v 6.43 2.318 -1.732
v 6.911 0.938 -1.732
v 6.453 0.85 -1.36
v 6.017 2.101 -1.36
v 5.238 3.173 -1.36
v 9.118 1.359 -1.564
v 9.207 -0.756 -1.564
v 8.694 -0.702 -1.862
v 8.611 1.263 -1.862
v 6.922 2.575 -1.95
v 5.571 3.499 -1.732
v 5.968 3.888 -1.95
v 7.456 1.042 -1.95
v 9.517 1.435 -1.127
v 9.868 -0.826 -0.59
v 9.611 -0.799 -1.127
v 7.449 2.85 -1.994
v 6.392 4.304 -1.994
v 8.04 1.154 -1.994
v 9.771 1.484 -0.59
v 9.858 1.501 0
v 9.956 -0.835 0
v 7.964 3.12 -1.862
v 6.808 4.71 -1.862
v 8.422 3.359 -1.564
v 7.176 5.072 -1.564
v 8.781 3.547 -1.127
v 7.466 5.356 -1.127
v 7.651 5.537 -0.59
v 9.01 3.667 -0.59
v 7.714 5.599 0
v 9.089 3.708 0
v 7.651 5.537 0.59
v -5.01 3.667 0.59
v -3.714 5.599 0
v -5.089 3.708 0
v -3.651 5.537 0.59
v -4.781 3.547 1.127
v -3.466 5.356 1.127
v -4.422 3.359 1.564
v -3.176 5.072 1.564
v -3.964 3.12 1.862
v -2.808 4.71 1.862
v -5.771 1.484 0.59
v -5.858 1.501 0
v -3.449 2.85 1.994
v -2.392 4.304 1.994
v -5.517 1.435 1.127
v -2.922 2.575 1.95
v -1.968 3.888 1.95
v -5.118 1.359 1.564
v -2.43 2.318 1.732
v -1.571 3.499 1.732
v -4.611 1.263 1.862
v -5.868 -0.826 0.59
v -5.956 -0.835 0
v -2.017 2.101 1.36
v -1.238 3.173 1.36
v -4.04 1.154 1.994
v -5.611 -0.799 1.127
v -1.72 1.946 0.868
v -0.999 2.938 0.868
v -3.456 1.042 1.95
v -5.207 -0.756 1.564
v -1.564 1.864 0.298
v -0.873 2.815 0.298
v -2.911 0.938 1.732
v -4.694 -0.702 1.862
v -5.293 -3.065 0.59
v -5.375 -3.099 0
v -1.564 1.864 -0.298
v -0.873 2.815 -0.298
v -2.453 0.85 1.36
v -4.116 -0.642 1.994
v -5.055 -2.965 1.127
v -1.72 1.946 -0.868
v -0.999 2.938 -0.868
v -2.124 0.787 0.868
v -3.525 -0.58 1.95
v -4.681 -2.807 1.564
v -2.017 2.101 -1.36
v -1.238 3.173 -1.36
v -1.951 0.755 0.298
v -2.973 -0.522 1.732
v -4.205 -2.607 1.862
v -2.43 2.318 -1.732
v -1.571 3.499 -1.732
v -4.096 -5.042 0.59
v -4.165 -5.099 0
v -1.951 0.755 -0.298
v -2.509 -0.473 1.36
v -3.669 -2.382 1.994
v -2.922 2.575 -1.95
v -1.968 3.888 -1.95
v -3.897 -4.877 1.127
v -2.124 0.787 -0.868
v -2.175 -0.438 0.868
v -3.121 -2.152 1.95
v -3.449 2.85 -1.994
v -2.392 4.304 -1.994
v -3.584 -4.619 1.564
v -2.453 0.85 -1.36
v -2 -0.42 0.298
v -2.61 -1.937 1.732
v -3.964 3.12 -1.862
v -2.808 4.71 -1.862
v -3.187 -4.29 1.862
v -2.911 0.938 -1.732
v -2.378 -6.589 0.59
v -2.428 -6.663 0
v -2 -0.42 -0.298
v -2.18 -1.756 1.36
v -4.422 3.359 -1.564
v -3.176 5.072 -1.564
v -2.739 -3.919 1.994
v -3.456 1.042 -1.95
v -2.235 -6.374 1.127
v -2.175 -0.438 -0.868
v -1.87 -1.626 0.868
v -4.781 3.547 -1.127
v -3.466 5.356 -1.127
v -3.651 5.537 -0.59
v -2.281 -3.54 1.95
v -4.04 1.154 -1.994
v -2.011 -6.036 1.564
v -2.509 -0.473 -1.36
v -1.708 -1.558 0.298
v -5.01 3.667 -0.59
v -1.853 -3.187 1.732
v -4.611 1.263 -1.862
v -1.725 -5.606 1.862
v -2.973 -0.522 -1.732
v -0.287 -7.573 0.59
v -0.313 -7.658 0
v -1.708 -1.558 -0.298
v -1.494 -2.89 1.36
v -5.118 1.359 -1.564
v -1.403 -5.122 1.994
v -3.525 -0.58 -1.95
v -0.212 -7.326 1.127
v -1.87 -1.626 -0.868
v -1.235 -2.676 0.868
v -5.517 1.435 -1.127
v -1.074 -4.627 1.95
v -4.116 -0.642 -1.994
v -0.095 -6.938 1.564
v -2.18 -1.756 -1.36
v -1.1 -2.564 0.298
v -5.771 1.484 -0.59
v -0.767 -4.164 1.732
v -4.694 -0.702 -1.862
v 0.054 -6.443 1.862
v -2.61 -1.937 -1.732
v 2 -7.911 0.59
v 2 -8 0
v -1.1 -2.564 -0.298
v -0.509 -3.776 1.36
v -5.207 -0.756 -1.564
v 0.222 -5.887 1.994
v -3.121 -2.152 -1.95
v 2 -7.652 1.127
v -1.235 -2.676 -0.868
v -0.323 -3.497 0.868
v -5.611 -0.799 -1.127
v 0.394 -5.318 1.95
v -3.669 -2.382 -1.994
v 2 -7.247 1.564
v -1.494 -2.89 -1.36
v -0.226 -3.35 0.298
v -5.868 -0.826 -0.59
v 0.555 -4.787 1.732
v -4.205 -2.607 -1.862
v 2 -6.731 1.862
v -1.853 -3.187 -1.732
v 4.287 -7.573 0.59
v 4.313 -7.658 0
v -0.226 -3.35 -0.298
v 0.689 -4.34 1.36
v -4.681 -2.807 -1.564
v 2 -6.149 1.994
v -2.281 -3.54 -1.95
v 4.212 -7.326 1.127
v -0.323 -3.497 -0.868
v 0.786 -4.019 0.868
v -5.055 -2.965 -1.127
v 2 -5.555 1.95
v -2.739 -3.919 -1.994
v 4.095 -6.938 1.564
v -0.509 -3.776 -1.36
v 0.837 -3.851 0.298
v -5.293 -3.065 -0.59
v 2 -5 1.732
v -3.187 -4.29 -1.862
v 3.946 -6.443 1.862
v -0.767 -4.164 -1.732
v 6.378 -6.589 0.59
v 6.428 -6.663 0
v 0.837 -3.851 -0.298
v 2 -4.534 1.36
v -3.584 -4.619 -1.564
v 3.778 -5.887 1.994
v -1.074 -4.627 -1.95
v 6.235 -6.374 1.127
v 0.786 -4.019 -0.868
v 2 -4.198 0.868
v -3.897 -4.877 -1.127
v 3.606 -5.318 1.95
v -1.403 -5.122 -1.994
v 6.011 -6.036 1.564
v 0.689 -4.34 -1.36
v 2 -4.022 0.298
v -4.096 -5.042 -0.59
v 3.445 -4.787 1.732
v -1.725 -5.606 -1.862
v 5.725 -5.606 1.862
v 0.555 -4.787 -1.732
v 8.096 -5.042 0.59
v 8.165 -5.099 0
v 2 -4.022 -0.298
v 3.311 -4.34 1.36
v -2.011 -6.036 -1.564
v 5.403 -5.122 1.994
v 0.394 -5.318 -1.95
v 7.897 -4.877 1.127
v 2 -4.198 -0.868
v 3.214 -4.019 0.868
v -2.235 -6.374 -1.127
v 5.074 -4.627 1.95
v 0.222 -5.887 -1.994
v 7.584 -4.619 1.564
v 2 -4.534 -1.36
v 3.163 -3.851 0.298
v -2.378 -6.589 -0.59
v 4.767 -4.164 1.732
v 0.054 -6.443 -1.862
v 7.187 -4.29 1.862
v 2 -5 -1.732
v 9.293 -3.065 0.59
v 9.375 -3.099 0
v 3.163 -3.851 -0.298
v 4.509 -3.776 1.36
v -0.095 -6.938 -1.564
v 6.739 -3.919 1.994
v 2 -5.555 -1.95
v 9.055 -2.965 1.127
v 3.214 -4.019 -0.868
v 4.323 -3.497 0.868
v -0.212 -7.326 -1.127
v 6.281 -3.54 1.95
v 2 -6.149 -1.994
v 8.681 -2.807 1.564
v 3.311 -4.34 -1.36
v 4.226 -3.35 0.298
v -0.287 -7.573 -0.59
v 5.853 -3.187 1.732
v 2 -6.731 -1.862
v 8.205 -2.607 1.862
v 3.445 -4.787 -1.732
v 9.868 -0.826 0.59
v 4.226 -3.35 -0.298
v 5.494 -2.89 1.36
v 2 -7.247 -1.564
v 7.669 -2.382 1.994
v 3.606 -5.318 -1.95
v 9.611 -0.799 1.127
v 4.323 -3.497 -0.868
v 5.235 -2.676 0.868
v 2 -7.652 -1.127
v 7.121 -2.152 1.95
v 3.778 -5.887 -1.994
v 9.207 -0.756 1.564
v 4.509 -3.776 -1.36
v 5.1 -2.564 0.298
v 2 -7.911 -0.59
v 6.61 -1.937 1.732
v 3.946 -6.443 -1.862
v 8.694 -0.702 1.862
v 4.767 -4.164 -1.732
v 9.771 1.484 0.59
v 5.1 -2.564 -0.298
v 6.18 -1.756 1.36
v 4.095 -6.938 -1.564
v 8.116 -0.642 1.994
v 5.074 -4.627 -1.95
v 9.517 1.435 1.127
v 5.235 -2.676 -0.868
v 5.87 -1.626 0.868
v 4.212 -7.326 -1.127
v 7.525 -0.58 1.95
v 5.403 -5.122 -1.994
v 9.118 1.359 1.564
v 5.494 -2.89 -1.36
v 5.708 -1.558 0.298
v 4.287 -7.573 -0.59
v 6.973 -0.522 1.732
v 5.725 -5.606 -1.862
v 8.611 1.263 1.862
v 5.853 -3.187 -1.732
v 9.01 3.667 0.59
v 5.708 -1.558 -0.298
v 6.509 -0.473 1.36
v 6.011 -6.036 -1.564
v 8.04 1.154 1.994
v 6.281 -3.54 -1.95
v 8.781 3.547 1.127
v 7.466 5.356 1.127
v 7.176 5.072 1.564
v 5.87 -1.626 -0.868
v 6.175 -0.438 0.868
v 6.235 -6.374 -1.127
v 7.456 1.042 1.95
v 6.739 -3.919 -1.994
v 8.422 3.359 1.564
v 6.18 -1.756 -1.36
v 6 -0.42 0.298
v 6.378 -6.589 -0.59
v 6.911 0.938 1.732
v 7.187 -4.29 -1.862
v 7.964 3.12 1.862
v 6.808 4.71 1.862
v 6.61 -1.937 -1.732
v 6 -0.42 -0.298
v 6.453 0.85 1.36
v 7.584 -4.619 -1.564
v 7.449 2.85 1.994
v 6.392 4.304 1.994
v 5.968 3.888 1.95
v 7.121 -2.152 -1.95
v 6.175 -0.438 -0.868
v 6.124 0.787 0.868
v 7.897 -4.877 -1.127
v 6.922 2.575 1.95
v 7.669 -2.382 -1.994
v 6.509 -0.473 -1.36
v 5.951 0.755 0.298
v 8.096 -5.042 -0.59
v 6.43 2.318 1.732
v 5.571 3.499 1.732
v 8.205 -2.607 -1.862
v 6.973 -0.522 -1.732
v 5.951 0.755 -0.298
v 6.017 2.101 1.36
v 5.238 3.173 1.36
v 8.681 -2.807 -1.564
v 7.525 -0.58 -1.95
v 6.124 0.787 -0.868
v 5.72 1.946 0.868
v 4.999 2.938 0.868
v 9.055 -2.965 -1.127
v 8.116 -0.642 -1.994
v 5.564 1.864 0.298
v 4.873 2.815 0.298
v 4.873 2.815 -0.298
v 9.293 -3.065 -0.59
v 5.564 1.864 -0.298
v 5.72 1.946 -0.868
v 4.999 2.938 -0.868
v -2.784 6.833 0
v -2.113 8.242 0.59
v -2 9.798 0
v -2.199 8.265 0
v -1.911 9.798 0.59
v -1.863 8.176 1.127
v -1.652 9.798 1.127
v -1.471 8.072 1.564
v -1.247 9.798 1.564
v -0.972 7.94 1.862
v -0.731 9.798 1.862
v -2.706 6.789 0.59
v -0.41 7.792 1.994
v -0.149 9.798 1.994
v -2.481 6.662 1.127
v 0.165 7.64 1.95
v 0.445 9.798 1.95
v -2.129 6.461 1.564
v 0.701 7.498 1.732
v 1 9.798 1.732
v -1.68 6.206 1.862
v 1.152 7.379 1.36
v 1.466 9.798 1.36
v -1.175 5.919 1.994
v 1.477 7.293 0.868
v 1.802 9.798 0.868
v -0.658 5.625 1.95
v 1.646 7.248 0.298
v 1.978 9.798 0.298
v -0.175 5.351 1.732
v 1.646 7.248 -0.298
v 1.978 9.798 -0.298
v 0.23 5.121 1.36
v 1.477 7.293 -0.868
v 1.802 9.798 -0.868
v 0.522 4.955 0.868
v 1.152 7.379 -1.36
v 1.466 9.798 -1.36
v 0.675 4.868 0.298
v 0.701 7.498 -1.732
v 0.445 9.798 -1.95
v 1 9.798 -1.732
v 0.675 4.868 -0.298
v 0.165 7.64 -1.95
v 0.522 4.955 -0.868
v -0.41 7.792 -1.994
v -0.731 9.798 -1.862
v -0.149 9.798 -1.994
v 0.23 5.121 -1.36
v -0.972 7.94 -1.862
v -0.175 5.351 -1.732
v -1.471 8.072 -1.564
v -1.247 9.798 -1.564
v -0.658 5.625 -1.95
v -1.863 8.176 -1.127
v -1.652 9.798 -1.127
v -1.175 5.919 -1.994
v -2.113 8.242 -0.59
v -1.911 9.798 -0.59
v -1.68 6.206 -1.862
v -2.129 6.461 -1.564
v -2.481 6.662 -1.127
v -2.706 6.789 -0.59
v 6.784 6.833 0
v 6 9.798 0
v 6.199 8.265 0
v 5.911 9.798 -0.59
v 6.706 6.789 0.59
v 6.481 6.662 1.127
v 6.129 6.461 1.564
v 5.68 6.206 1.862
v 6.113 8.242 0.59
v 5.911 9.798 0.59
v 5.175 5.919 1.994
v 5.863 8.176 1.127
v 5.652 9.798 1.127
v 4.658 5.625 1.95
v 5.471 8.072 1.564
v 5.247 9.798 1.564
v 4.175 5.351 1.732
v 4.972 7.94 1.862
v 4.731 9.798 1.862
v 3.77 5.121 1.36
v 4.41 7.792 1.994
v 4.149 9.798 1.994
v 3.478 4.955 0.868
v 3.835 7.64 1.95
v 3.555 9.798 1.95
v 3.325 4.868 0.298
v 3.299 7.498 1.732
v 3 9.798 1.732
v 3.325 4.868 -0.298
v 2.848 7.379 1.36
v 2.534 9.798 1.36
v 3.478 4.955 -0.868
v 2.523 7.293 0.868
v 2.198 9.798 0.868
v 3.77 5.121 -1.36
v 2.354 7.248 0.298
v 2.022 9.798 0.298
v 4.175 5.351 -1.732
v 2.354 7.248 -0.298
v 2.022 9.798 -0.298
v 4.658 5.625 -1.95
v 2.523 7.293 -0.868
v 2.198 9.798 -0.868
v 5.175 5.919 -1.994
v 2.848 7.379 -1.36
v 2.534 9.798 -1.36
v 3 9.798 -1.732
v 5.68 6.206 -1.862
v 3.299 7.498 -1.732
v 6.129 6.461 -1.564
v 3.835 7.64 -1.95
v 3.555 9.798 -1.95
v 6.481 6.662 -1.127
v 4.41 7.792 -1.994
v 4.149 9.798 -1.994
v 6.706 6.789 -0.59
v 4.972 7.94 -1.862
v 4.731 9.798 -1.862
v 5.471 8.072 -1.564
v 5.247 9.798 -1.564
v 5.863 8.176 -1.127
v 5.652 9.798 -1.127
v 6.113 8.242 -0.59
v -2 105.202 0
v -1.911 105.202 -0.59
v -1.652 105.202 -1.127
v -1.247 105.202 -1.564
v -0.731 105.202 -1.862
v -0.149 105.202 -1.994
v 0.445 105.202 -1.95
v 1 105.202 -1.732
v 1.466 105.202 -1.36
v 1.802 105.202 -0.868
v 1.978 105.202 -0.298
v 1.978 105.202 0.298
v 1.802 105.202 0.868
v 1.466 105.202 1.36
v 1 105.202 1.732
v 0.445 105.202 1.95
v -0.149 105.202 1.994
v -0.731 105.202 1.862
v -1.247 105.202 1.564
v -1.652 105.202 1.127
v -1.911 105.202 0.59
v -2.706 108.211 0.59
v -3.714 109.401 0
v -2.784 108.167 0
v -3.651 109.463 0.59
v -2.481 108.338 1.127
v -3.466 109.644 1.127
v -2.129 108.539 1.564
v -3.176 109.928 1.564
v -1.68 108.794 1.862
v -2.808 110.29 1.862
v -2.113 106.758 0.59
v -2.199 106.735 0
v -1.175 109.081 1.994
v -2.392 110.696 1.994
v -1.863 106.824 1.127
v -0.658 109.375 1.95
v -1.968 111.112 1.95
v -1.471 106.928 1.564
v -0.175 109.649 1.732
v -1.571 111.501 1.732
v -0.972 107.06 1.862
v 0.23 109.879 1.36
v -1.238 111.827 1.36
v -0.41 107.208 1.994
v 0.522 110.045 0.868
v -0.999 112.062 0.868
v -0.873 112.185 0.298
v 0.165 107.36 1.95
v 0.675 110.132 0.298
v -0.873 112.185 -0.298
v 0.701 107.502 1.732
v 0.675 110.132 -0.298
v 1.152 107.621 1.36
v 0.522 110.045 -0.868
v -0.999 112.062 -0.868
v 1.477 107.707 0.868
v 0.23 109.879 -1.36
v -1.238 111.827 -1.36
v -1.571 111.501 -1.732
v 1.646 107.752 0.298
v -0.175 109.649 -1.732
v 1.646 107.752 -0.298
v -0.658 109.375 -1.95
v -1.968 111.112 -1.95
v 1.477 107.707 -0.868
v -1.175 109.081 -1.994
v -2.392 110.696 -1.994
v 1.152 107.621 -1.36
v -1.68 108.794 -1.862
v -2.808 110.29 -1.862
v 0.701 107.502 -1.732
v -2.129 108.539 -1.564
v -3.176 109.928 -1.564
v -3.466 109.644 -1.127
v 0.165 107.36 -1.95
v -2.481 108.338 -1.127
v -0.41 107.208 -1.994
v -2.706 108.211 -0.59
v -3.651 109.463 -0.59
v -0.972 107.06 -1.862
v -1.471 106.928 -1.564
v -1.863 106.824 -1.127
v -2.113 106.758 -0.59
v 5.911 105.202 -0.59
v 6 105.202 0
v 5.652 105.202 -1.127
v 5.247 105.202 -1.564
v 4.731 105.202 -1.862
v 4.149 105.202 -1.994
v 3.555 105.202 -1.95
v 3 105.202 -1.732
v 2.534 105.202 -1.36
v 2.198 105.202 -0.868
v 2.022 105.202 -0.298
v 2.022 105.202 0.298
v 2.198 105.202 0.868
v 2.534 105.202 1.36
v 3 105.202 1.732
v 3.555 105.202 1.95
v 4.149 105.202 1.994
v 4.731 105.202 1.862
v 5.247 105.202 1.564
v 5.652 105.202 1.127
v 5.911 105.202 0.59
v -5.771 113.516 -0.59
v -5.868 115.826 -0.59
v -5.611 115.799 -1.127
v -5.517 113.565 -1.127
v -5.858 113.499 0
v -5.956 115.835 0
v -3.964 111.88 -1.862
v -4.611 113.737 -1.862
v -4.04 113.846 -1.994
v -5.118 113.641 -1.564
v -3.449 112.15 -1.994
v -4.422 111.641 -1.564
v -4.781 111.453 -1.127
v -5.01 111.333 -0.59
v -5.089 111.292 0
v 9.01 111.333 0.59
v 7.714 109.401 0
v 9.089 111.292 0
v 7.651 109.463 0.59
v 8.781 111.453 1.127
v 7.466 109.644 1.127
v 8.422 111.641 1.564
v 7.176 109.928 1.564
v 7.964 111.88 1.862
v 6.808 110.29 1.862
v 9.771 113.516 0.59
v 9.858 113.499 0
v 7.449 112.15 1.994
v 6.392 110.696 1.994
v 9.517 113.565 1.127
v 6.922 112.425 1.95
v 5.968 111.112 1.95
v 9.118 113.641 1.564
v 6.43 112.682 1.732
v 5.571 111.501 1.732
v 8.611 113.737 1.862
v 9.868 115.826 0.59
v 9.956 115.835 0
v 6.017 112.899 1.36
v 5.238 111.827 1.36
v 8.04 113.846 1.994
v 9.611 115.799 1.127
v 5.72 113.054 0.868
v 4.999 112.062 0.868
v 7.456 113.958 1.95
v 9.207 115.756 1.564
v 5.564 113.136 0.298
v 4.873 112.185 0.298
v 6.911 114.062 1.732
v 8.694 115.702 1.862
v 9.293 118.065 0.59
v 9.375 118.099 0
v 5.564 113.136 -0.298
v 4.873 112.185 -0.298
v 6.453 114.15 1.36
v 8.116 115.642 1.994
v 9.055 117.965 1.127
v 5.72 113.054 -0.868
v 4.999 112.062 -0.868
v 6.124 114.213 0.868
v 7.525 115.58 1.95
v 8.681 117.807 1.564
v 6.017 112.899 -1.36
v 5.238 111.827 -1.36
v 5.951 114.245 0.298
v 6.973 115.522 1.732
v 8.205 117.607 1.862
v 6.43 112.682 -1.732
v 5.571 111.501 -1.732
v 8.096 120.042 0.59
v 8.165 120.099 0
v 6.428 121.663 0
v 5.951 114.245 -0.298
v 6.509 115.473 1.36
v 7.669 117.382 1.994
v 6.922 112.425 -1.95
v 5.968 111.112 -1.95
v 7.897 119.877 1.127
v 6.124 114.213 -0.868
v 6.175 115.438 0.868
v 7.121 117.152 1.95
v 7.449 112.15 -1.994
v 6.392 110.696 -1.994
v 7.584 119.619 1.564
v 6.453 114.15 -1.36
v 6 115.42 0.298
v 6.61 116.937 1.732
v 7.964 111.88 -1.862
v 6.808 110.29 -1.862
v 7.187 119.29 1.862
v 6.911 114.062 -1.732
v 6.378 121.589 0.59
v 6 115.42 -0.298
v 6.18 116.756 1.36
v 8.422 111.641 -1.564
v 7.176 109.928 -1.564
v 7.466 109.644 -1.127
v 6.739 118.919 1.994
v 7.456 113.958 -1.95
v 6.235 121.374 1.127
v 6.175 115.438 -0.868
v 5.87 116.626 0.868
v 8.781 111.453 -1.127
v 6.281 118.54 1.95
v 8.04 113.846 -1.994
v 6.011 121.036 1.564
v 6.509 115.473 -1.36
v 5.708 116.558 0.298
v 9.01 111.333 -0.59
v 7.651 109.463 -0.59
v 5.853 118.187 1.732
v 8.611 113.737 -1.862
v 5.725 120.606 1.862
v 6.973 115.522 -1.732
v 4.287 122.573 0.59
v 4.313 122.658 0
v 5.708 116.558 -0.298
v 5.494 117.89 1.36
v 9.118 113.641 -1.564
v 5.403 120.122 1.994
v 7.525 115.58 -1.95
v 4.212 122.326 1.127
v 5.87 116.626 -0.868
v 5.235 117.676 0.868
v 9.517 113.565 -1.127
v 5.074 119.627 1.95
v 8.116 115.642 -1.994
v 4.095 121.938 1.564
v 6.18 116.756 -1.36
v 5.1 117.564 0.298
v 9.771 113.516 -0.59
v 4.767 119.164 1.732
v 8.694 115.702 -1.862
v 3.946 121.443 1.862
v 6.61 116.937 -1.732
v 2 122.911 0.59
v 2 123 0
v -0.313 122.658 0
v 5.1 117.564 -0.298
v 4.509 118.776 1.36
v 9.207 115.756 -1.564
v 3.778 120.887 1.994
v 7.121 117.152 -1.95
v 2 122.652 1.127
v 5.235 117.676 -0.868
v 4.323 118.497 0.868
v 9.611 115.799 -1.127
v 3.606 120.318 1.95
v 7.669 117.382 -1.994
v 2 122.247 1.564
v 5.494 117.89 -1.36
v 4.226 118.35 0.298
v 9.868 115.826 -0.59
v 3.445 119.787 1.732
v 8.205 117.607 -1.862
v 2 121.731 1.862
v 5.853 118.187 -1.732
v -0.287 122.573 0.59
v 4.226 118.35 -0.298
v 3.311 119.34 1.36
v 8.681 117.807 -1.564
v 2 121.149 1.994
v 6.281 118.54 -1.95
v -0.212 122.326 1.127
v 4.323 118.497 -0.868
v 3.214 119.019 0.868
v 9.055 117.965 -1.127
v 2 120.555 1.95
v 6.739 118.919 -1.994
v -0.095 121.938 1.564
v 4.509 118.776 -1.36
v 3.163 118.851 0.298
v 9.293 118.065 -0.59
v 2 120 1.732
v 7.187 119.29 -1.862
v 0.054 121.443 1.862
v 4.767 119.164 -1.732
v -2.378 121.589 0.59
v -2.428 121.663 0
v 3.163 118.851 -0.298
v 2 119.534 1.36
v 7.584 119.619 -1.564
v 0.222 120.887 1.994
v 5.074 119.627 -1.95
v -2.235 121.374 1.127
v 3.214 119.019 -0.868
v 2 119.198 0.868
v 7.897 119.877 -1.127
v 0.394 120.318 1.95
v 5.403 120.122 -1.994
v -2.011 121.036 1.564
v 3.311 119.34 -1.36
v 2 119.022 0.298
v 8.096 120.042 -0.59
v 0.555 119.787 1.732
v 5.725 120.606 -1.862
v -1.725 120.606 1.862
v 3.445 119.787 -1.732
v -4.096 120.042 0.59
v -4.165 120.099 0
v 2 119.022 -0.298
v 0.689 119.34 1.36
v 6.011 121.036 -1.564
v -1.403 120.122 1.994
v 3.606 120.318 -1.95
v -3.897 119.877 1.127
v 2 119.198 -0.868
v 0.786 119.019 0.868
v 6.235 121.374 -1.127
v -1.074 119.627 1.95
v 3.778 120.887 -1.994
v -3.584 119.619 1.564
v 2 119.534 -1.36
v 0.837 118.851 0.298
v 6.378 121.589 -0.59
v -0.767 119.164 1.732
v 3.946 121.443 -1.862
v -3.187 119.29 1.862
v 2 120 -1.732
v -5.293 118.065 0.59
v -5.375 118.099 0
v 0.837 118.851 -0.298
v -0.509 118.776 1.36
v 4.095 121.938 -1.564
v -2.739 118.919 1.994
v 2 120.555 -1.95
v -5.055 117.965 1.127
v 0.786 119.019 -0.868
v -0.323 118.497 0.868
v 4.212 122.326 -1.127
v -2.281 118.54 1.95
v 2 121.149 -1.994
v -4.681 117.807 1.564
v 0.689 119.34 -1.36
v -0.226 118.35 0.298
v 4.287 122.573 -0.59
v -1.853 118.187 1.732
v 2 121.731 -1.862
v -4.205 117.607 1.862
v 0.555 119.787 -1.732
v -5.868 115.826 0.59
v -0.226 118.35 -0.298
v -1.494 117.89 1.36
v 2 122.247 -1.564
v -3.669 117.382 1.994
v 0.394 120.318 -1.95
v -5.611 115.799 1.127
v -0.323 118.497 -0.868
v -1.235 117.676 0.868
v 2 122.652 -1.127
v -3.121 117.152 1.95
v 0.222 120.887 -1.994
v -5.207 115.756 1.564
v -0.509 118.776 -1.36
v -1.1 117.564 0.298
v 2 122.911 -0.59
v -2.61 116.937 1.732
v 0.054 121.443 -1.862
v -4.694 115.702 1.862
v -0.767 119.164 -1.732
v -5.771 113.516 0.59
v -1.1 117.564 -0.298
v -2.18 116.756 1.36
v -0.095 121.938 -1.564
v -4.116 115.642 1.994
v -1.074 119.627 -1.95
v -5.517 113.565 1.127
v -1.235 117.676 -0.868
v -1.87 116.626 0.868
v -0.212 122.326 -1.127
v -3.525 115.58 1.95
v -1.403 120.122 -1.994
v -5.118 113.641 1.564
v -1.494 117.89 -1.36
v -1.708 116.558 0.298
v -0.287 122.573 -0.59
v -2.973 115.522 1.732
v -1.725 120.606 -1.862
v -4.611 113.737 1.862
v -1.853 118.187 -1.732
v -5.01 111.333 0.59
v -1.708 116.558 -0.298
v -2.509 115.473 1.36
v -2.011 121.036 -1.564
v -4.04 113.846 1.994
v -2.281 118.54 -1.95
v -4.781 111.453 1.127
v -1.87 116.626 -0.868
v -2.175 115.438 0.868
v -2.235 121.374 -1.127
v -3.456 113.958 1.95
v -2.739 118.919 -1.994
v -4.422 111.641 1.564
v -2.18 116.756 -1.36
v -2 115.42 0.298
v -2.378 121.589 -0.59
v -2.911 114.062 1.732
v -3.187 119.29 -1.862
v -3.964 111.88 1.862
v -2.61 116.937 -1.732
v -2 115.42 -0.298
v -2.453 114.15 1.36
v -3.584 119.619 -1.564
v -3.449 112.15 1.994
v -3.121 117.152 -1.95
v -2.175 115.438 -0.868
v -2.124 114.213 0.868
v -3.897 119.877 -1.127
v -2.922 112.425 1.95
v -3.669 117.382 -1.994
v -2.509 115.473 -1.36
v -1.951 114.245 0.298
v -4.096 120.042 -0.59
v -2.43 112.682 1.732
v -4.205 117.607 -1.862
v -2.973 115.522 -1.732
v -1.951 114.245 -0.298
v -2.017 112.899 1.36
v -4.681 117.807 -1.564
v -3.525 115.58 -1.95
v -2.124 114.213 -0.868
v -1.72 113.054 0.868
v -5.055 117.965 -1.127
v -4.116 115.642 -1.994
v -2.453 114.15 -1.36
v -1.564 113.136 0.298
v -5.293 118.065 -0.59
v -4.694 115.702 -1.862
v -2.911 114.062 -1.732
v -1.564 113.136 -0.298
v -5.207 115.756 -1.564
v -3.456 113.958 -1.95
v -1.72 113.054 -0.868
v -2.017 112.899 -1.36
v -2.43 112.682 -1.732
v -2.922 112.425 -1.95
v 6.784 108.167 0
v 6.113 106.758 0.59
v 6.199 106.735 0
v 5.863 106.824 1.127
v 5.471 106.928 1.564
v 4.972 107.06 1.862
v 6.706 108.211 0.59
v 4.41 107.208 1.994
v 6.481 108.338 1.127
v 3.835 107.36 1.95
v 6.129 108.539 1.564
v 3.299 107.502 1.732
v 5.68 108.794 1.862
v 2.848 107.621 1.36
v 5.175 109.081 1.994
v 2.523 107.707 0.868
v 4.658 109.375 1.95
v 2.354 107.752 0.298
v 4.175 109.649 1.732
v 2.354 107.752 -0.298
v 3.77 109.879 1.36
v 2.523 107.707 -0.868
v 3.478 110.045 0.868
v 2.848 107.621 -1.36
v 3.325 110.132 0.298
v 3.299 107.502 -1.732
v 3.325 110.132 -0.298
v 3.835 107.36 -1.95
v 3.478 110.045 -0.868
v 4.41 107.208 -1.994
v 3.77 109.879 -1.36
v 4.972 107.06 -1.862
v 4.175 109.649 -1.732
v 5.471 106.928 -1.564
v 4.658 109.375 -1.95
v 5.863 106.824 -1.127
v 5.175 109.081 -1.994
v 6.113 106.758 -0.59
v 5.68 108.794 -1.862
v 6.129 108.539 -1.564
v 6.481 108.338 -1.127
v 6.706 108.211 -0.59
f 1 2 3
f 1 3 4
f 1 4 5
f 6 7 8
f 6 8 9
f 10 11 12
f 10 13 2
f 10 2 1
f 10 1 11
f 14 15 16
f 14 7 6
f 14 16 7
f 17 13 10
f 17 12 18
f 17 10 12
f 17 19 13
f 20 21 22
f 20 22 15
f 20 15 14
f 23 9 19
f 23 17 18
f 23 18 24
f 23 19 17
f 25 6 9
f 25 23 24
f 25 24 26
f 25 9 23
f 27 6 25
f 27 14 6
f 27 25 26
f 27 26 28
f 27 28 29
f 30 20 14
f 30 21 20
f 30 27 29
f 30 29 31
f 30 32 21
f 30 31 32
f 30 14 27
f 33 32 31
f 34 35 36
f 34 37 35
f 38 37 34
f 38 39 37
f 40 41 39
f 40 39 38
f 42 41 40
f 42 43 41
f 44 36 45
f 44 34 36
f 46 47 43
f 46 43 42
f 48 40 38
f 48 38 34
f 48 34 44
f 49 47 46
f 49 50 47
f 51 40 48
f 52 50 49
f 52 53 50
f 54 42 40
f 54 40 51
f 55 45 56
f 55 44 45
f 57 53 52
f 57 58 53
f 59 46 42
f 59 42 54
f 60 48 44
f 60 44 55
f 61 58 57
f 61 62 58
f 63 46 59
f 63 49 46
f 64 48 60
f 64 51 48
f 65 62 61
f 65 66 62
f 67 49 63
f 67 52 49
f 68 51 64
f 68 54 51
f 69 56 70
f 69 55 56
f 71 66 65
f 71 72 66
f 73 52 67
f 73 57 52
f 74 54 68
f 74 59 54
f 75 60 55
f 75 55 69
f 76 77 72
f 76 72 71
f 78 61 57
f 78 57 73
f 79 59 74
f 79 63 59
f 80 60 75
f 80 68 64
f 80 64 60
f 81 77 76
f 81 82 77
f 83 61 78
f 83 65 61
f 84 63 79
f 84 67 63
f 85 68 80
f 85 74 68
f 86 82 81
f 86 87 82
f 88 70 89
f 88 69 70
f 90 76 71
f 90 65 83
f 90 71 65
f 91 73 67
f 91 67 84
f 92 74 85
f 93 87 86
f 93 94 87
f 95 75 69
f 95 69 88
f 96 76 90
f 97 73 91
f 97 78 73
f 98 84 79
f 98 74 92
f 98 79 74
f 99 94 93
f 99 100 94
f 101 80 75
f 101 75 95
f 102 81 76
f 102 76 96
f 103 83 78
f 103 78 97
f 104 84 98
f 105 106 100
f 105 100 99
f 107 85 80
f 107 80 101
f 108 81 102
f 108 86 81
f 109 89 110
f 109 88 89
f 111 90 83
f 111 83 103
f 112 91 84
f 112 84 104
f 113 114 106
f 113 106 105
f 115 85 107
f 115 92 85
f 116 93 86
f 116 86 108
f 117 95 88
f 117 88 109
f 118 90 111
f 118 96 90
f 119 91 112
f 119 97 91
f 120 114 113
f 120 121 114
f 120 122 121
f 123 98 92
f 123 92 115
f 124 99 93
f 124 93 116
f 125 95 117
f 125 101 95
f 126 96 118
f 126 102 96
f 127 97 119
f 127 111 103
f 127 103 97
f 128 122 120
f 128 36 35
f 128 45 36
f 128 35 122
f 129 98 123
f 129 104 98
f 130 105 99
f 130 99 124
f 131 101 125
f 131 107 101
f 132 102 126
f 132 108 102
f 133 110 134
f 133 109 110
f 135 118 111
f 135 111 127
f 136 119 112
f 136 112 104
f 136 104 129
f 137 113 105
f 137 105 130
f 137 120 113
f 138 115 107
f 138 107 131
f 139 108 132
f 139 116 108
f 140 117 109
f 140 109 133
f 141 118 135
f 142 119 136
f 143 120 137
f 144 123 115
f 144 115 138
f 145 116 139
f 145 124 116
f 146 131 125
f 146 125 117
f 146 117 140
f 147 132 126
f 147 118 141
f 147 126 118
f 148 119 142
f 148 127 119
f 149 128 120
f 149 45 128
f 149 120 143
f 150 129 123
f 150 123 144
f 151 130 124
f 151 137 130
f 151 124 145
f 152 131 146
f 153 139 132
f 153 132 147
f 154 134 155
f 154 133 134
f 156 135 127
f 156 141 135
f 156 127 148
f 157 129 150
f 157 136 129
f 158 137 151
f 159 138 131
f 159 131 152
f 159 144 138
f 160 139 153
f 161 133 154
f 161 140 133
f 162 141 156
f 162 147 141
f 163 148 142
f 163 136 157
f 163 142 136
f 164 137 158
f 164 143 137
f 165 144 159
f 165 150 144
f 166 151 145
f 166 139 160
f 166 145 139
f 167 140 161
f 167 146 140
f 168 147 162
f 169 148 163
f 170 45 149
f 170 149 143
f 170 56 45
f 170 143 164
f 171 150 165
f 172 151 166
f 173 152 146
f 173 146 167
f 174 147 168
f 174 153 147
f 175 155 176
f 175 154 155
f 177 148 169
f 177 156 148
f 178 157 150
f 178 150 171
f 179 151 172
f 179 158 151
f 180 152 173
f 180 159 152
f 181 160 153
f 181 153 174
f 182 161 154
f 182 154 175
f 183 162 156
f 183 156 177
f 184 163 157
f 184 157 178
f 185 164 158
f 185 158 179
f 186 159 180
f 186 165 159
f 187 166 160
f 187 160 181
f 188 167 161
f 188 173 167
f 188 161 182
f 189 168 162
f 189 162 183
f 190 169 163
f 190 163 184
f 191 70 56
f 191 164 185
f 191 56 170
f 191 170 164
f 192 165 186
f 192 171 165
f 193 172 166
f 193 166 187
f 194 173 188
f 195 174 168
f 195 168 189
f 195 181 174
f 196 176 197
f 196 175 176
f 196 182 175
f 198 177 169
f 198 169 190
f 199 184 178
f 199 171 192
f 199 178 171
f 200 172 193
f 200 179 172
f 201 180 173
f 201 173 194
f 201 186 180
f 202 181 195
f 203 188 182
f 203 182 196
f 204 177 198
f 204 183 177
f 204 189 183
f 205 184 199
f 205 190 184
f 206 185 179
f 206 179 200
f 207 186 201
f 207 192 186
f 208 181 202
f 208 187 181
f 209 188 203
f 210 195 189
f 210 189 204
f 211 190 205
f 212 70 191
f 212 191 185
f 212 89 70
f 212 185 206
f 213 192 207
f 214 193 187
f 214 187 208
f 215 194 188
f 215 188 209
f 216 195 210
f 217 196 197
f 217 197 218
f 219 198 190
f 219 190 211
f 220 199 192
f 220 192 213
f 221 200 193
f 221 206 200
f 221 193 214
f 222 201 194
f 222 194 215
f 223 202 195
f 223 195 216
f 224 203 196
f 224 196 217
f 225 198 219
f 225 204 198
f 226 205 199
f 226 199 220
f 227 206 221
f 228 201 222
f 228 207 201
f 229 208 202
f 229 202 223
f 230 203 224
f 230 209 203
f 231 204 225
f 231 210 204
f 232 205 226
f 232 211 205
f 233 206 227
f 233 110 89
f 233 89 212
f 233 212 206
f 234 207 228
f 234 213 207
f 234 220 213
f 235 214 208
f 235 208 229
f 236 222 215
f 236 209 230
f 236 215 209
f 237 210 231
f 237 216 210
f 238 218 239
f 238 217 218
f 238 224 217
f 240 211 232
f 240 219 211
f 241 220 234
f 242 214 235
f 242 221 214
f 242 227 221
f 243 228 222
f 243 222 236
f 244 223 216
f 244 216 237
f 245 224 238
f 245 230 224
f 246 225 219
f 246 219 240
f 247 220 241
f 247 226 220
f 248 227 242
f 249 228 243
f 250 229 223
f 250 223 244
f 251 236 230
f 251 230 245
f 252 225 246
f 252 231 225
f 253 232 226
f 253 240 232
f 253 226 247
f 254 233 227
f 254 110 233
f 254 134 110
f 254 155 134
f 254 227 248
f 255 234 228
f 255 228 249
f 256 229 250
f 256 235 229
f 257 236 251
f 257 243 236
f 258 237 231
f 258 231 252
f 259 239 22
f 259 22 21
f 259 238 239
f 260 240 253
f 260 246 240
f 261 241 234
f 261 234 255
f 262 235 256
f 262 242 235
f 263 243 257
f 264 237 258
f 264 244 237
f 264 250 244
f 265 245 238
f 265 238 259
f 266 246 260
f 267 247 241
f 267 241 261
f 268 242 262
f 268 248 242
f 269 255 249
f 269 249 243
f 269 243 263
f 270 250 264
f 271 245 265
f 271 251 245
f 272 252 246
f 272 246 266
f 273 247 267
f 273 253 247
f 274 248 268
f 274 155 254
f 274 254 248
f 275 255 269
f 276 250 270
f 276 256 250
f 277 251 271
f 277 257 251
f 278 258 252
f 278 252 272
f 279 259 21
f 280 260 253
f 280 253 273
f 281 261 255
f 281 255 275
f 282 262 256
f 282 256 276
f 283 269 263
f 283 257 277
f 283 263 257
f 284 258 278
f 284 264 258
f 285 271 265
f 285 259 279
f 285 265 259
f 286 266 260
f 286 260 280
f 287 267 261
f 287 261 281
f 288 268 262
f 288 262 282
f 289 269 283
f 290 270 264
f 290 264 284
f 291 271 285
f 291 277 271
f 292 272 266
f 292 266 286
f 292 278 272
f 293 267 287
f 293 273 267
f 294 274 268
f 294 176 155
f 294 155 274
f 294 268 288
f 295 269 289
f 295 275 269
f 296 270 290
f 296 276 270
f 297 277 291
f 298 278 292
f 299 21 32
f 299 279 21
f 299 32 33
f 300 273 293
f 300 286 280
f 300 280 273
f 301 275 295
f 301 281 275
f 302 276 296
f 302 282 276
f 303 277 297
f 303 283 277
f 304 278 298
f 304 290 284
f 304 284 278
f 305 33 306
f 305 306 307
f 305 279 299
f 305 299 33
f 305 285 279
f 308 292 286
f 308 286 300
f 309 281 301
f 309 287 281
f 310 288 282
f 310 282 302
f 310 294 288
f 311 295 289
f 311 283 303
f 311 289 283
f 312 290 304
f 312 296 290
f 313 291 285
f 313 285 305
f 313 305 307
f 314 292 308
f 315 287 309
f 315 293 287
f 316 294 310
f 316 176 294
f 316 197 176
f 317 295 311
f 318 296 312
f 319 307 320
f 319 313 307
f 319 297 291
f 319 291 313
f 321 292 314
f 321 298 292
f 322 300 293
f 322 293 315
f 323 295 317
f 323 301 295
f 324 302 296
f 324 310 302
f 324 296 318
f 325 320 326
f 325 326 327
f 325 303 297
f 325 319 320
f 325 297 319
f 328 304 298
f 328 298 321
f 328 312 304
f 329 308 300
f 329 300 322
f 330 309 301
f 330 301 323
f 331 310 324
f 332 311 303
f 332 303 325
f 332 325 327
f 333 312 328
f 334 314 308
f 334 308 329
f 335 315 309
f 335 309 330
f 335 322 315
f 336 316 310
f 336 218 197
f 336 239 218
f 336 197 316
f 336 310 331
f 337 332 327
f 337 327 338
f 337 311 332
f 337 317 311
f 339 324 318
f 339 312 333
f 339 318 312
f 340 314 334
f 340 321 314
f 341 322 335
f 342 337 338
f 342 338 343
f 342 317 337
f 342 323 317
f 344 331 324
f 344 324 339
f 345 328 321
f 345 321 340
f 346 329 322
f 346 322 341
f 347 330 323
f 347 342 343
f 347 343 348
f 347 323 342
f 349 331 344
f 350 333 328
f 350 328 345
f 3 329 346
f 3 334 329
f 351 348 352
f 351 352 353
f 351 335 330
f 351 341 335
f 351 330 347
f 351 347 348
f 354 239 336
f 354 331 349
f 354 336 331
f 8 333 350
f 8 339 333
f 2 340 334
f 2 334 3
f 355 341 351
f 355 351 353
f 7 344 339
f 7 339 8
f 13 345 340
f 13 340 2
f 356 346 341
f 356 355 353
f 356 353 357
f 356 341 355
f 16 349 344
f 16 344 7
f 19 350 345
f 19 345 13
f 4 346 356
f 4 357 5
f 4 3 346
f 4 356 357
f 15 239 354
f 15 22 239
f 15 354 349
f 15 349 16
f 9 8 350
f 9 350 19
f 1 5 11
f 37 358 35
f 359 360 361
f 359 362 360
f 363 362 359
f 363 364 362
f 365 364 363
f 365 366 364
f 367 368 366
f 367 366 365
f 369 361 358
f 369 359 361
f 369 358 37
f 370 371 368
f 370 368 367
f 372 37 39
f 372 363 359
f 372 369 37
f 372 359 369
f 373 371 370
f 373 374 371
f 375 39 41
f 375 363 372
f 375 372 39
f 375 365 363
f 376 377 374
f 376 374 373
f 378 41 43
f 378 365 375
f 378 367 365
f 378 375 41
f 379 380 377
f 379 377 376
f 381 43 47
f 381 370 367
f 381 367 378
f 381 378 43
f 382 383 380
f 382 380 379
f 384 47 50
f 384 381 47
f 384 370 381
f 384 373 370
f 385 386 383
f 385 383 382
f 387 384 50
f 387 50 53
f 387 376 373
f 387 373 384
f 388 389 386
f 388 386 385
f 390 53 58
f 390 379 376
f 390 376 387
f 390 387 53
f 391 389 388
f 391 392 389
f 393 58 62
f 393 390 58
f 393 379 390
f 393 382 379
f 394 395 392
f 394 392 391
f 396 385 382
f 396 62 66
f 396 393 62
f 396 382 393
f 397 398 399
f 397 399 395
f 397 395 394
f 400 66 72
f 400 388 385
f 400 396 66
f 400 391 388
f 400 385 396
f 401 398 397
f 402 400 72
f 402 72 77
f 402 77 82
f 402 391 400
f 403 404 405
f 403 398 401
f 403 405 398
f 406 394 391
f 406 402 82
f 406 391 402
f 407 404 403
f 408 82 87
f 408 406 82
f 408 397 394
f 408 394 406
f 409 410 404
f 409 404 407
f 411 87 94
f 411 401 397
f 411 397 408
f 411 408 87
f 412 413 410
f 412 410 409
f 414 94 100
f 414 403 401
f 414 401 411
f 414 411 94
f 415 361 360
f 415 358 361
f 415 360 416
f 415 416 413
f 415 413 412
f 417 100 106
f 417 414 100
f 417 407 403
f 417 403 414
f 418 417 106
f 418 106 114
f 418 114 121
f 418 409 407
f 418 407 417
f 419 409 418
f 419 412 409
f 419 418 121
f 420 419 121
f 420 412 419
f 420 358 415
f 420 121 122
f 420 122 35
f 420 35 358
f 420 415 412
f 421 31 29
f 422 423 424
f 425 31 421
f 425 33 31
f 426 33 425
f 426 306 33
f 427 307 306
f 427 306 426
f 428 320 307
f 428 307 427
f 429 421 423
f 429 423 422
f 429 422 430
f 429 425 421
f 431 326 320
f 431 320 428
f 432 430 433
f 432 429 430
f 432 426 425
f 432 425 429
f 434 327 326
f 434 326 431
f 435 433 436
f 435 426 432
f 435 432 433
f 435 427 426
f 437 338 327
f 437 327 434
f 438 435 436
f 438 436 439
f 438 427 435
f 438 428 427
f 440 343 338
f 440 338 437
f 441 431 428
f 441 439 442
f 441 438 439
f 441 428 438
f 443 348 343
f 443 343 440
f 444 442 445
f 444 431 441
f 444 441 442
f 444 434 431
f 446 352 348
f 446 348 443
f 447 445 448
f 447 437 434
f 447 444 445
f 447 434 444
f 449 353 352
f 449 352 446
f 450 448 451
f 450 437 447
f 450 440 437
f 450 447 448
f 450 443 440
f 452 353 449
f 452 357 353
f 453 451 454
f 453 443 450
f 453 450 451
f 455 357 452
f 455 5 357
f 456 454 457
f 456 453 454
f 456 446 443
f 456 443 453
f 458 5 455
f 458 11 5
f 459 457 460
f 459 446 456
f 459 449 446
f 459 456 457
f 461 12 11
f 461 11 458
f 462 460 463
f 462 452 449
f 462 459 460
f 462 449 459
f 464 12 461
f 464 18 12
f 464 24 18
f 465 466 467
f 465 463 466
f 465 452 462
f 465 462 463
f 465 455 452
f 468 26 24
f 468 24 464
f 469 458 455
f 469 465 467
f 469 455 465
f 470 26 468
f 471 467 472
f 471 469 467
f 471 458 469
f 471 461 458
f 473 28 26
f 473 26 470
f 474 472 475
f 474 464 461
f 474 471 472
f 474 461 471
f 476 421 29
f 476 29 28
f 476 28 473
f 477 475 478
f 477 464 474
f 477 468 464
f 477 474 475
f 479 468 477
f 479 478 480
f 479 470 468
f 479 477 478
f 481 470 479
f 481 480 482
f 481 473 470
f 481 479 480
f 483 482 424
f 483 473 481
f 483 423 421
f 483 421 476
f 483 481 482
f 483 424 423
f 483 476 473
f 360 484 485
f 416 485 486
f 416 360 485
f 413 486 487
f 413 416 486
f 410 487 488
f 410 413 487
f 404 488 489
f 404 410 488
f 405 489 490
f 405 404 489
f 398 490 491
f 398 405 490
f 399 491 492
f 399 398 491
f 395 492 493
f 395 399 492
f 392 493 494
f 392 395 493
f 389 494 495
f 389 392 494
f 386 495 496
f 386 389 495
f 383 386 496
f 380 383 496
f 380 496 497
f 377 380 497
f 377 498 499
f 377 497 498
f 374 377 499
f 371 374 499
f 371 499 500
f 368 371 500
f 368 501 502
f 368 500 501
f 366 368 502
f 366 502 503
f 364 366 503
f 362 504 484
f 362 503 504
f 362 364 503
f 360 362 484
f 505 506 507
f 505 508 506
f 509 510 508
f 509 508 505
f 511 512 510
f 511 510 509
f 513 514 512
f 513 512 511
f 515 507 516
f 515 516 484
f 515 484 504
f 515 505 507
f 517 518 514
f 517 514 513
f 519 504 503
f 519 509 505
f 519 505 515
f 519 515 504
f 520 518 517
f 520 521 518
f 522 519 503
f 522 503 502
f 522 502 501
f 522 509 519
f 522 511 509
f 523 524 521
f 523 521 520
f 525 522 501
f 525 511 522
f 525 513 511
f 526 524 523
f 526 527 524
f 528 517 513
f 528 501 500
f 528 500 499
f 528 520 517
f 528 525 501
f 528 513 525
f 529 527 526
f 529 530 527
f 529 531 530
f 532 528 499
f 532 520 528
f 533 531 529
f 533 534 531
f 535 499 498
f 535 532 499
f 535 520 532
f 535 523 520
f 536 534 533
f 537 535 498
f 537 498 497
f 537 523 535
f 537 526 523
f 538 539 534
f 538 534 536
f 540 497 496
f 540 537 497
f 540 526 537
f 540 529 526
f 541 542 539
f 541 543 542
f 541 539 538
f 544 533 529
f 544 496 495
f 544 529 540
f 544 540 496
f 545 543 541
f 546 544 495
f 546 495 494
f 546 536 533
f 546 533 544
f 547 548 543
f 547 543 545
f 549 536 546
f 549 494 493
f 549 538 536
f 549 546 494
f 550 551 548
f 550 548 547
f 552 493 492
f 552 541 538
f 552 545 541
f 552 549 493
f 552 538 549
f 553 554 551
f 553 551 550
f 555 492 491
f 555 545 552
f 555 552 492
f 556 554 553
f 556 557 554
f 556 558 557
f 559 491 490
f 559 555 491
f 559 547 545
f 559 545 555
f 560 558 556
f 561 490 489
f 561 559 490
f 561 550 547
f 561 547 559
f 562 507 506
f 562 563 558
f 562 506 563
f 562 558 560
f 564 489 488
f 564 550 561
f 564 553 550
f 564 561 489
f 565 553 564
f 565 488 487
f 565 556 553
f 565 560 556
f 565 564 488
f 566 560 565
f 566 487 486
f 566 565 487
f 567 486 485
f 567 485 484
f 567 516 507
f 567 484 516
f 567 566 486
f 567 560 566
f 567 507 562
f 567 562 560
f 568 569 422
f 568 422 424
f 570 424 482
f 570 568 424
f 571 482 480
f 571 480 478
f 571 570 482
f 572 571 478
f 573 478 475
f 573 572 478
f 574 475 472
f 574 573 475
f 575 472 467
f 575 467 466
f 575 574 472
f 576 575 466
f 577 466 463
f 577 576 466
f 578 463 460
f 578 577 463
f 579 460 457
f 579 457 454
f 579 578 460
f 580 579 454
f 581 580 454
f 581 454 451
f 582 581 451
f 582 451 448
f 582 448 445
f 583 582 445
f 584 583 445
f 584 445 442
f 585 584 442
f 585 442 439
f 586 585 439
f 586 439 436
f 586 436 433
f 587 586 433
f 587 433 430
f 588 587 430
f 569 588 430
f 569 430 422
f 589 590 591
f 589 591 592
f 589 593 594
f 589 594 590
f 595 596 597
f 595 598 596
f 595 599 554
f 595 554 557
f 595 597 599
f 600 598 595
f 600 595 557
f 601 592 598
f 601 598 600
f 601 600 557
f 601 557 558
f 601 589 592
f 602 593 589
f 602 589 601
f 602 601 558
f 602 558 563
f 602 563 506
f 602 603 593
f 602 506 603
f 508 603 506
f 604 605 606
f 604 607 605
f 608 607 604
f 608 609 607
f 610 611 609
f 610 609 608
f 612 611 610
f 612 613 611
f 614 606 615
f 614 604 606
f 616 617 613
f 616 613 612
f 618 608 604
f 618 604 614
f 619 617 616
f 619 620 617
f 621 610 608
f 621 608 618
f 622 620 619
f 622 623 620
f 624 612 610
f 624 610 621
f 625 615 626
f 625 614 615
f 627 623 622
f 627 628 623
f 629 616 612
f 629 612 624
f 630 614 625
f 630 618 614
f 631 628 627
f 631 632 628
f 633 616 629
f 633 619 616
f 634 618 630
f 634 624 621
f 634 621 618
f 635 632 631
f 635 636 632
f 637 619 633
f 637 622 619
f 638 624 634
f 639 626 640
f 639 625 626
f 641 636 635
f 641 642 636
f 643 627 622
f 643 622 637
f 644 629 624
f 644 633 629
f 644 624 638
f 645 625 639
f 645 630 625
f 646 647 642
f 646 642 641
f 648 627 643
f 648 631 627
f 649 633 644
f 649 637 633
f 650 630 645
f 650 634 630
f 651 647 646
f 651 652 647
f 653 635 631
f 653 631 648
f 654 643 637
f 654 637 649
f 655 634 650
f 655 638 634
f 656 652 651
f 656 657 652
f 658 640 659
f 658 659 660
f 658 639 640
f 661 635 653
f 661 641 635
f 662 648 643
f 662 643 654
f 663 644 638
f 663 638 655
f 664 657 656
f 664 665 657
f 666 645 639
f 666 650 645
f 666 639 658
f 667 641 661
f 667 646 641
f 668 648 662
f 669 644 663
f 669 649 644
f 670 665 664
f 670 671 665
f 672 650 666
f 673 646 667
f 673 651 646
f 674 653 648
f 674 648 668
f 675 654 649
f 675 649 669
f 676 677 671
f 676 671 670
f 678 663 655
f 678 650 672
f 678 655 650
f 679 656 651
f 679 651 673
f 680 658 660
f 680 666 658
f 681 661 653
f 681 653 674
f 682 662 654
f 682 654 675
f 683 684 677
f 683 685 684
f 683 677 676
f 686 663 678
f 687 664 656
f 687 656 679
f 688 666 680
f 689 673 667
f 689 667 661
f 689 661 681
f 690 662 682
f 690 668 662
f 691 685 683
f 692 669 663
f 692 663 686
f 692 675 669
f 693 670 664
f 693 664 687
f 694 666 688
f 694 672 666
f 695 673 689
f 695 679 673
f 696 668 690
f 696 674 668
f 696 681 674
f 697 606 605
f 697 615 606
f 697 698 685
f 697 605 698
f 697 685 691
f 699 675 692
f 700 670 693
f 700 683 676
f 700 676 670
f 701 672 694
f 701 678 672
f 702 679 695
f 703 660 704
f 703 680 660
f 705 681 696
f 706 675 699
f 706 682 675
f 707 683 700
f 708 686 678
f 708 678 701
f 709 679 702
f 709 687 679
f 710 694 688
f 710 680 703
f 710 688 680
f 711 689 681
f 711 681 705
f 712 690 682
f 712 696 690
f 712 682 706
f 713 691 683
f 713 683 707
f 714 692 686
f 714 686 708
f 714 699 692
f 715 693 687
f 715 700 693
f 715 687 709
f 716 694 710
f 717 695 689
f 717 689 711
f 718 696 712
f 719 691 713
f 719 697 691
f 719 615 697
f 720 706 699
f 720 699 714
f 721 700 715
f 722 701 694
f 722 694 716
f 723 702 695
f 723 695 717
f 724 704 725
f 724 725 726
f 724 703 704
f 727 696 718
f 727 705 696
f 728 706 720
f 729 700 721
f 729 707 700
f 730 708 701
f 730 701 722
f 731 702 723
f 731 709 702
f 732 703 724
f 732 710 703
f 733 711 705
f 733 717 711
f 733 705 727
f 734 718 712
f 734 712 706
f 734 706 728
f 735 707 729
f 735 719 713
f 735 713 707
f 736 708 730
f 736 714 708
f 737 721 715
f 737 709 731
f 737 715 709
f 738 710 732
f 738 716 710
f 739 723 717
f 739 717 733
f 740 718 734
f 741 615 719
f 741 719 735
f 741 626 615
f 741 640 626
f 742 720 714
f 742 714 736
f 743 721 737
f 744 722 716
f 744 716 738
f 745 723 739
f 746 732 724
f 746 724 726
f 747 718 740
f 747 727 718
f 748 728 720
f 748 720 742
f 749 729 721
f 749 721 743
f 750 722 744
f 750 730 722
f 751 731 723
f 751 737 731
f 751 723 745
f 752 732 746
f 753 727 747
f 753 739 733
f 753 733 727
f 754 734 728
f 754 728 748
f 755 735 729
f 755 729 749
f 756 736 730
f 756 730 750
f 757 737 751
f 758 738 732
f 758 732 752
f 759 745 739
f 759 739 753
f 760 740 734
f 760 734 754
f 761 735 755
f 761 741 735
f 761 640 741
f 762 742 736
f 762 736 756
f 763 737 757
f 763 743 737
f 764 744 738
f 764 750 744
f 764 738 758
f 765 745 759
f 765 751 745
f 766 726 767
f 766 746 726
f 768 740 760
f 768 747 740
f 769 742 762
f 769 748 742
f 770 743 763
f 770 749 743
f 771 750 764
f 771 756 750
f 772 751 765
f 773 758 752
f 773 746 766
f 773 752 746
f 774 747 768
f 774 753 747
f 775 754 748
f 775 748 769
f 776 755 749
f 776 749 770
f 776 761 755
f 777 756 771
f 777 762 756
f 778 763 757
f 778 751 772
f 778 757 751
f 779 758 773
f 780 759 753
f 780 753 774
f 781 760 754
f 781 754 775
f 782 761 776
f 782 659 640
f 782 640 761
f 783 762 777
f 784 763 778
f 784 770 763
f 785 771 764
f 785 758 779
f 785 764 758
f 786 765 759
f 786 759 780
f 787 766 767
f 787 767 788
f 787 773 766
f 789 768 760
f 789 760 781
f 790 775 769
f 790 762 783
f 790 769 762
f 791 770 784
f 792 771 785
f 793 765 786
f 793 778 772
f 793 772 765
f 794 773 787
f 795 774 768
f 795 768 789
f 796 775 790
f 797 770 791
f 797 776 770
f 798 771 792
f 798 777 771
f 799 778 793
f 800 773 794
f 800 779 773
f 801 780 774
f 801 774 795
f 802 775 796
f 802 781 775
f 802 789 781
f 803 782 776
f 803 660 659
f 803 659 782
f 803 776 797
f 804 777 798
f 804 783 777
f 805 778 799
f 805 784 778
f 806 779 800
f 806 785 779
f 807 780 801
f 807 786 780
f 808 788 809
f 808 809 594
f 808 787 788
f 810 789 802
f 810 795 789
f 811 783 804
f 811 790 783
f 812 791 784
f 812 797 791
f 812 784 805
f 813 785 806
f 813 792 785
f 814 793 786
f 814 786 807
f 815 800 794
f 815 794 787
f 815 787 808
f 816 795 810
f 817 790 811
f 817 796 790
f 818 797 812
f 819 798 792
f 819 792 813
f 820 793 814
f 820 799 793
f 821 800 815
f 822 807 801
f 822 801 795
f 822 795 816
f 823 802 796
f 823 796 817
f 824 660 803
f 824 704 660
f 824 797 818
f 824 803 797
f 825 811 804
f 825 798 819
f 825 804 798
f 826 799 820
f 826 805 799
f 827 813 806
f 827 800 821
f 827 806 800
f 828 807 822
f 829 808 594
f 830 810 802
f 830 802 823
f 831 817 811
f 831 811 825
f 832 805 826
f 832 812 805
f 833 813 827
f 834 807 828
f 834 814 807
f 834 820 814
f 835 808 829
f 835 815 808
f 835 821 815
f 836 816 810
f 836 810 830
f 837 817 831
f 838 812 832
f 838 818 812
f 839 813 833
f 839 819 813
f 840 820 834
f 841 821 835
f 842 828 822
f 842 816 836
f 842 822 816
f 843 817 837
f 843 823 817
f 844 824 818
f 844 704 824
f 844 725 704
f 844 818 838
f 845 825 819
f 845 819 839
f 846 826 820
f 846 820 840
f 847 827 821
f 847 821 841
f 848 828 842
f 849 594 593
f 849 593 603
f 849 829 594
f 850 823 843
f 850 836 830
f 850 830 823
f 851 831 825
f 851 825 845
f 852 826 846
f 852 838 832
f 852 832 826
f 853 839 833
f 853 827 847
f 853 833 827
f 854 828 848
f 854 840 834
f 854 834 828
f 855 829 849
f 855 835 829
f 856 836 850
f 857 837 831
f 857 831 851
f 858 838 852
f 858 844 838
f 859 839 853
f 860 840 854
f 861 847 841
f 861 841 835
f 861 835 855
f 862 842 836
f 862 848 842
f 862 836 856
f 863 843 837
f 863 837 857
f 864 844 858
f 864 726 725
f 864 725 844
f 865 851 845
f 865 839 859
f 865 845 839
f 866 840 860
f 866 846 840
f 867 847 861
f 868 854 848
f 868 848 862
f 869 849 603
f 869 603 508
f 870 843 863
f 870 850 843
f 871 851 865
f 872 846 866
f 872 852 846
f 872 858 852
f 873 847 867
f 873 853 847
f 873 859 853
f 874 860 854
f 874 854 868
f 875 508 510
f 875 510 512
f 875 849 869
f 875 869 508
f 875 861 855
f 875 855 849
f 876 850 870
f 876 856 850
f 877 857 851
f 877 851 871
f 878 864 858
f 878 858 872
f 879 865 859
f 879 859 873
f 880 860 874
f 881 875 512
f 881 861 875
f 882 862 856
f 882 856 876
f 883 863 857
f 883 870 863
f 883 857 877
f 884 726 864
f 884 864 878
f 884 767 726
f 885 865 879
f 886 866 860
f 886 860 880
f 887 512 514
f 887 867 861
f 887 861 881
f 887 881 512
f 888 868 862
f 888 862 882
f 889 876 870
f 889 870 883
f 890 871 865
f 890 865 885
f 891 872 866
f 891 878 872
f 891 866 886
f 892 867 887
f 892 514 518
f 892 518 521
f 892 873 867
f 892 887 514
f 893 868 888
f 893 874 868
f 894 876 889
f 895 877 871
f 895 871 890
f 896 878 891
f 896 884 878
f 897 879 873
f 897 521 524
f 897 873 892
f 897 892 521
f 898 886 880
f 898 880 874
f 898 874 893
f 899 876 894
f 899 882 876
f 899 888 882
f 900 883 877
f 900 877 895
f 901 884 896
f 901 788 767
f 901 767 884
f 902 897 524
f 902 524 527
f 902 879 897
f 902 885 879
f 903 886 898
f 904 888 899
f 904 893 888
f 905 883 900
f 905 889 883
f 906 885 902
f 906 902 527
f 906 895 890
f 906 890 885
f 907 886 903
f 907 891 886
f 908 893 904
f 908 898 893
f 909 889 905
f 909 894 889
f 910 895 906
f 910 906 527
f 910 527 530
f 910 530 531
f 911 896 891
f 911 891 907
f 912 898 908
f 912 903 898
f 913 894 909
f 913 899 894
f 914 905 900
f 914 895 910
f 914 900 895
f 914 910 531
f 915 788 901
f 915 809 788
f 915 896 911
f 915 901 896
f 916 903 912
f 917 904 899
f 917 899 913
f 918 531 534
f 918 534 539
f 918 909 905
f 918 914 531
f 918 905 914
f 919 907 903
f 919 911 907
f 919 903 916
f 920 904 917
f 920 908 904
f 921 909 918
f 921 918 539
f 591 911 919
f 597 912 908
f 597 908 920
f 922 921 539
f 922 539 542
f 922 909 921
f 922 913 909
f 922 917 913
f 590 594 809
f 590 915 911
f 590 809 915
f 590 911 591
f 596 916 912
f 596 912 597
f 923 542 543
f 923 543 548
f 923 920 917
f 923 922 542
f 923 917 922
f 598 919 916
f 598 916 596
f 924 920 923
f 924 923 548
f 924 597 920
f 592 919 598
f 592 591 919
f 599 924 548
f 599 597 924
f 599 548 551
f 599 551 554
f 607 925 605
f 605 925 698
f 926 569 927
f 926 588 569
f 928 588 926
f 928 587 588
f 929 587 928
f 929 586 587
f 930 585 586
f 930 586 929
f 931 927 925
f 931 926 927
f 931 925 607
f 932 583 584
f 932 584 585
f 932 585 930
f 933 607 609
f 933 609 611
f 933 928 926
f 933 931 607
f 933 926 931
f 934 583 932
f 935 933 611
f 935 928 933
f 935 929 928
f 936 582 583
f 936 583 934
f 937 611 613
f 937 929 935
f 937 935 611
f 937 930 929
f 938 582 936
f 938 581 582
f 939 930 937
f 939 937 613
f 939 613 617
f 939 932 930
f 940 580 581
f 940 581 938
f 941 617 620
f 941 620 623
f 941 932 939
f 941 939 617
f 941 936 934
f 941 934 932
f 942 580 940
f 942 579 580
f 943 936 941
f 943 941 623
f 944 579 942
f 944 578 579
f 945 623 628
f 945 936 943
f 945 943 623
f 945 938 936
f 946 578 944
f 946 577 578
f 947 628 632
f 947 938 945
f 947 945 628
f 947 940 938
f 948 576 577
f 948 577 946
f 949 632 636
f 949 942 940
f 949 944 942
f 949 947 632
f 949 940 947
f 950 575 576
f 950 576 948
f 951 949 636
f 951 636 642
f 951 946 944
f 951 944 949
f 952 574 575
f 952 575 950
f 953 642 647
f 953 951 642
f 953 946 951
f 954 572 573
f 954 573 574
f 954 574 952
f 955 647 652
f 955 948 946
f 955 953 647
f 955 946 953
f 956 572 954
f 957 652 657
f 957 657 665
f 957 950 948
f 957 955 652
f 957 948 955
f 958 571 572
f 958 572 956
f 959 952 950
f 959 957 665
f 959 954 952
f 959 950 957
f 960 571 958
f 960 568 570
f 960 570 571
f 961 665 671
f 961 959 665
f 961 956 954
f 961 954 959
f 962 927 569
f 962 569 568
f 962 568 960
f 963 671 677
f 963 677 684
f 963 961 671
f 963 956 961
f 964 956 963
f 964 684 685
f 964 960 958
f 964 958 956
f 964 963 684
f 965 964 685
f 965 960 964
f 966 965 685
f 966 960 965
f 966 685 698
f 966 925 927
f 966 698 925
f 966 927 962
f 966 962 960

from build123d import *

# Parameters (mm, degrees)
SKETCH2_R = 2


with BuildPart() as part:
    # Sweep1: sweep along a path in Sketch1
    with BuildLine(Plane.XY) as sweep1_path:
        Line((4, 9.797958971), (4, 105.202041029))
        ThreePointArc((4, 105.202041029), (4.593439202, 108.225756813), (6.285714286, 110.800874727))
        ThreePointArc((6.285714286, 110.800874727), (2, 121), (-2.285714286, 110.800874727))
        ThreePointArc((-2.285714286, 110.800874727), (-0.593439202, 108.225756813), (0, 105.202041029))
        Line((0, 105.202041029), (0, 9.797958971))
        ThreePointArc((0, 9.797958971), (-0.593439202, 6.774243187), (-2.285714286, 4.199125273))
        ThreePointArc((-2.285714286, 4.199125273), (2, -6), (6.285714286, 4.199125273))
        ThreePointArc((6.285714286, 4.199125273), (4.593439202, 6.774243187), (4, 9.797958971))
    # Sketch2 → Sweep1 (sweep)
    with BuildSketch(Plane(origin=(0, 10, 0), x_dir=(-1, 0, 0), z_dir=(0, 1, 0))):
        Circle(SKETCH2_R)
    sweep(path=sweep1_path.line)


solid = part.part
